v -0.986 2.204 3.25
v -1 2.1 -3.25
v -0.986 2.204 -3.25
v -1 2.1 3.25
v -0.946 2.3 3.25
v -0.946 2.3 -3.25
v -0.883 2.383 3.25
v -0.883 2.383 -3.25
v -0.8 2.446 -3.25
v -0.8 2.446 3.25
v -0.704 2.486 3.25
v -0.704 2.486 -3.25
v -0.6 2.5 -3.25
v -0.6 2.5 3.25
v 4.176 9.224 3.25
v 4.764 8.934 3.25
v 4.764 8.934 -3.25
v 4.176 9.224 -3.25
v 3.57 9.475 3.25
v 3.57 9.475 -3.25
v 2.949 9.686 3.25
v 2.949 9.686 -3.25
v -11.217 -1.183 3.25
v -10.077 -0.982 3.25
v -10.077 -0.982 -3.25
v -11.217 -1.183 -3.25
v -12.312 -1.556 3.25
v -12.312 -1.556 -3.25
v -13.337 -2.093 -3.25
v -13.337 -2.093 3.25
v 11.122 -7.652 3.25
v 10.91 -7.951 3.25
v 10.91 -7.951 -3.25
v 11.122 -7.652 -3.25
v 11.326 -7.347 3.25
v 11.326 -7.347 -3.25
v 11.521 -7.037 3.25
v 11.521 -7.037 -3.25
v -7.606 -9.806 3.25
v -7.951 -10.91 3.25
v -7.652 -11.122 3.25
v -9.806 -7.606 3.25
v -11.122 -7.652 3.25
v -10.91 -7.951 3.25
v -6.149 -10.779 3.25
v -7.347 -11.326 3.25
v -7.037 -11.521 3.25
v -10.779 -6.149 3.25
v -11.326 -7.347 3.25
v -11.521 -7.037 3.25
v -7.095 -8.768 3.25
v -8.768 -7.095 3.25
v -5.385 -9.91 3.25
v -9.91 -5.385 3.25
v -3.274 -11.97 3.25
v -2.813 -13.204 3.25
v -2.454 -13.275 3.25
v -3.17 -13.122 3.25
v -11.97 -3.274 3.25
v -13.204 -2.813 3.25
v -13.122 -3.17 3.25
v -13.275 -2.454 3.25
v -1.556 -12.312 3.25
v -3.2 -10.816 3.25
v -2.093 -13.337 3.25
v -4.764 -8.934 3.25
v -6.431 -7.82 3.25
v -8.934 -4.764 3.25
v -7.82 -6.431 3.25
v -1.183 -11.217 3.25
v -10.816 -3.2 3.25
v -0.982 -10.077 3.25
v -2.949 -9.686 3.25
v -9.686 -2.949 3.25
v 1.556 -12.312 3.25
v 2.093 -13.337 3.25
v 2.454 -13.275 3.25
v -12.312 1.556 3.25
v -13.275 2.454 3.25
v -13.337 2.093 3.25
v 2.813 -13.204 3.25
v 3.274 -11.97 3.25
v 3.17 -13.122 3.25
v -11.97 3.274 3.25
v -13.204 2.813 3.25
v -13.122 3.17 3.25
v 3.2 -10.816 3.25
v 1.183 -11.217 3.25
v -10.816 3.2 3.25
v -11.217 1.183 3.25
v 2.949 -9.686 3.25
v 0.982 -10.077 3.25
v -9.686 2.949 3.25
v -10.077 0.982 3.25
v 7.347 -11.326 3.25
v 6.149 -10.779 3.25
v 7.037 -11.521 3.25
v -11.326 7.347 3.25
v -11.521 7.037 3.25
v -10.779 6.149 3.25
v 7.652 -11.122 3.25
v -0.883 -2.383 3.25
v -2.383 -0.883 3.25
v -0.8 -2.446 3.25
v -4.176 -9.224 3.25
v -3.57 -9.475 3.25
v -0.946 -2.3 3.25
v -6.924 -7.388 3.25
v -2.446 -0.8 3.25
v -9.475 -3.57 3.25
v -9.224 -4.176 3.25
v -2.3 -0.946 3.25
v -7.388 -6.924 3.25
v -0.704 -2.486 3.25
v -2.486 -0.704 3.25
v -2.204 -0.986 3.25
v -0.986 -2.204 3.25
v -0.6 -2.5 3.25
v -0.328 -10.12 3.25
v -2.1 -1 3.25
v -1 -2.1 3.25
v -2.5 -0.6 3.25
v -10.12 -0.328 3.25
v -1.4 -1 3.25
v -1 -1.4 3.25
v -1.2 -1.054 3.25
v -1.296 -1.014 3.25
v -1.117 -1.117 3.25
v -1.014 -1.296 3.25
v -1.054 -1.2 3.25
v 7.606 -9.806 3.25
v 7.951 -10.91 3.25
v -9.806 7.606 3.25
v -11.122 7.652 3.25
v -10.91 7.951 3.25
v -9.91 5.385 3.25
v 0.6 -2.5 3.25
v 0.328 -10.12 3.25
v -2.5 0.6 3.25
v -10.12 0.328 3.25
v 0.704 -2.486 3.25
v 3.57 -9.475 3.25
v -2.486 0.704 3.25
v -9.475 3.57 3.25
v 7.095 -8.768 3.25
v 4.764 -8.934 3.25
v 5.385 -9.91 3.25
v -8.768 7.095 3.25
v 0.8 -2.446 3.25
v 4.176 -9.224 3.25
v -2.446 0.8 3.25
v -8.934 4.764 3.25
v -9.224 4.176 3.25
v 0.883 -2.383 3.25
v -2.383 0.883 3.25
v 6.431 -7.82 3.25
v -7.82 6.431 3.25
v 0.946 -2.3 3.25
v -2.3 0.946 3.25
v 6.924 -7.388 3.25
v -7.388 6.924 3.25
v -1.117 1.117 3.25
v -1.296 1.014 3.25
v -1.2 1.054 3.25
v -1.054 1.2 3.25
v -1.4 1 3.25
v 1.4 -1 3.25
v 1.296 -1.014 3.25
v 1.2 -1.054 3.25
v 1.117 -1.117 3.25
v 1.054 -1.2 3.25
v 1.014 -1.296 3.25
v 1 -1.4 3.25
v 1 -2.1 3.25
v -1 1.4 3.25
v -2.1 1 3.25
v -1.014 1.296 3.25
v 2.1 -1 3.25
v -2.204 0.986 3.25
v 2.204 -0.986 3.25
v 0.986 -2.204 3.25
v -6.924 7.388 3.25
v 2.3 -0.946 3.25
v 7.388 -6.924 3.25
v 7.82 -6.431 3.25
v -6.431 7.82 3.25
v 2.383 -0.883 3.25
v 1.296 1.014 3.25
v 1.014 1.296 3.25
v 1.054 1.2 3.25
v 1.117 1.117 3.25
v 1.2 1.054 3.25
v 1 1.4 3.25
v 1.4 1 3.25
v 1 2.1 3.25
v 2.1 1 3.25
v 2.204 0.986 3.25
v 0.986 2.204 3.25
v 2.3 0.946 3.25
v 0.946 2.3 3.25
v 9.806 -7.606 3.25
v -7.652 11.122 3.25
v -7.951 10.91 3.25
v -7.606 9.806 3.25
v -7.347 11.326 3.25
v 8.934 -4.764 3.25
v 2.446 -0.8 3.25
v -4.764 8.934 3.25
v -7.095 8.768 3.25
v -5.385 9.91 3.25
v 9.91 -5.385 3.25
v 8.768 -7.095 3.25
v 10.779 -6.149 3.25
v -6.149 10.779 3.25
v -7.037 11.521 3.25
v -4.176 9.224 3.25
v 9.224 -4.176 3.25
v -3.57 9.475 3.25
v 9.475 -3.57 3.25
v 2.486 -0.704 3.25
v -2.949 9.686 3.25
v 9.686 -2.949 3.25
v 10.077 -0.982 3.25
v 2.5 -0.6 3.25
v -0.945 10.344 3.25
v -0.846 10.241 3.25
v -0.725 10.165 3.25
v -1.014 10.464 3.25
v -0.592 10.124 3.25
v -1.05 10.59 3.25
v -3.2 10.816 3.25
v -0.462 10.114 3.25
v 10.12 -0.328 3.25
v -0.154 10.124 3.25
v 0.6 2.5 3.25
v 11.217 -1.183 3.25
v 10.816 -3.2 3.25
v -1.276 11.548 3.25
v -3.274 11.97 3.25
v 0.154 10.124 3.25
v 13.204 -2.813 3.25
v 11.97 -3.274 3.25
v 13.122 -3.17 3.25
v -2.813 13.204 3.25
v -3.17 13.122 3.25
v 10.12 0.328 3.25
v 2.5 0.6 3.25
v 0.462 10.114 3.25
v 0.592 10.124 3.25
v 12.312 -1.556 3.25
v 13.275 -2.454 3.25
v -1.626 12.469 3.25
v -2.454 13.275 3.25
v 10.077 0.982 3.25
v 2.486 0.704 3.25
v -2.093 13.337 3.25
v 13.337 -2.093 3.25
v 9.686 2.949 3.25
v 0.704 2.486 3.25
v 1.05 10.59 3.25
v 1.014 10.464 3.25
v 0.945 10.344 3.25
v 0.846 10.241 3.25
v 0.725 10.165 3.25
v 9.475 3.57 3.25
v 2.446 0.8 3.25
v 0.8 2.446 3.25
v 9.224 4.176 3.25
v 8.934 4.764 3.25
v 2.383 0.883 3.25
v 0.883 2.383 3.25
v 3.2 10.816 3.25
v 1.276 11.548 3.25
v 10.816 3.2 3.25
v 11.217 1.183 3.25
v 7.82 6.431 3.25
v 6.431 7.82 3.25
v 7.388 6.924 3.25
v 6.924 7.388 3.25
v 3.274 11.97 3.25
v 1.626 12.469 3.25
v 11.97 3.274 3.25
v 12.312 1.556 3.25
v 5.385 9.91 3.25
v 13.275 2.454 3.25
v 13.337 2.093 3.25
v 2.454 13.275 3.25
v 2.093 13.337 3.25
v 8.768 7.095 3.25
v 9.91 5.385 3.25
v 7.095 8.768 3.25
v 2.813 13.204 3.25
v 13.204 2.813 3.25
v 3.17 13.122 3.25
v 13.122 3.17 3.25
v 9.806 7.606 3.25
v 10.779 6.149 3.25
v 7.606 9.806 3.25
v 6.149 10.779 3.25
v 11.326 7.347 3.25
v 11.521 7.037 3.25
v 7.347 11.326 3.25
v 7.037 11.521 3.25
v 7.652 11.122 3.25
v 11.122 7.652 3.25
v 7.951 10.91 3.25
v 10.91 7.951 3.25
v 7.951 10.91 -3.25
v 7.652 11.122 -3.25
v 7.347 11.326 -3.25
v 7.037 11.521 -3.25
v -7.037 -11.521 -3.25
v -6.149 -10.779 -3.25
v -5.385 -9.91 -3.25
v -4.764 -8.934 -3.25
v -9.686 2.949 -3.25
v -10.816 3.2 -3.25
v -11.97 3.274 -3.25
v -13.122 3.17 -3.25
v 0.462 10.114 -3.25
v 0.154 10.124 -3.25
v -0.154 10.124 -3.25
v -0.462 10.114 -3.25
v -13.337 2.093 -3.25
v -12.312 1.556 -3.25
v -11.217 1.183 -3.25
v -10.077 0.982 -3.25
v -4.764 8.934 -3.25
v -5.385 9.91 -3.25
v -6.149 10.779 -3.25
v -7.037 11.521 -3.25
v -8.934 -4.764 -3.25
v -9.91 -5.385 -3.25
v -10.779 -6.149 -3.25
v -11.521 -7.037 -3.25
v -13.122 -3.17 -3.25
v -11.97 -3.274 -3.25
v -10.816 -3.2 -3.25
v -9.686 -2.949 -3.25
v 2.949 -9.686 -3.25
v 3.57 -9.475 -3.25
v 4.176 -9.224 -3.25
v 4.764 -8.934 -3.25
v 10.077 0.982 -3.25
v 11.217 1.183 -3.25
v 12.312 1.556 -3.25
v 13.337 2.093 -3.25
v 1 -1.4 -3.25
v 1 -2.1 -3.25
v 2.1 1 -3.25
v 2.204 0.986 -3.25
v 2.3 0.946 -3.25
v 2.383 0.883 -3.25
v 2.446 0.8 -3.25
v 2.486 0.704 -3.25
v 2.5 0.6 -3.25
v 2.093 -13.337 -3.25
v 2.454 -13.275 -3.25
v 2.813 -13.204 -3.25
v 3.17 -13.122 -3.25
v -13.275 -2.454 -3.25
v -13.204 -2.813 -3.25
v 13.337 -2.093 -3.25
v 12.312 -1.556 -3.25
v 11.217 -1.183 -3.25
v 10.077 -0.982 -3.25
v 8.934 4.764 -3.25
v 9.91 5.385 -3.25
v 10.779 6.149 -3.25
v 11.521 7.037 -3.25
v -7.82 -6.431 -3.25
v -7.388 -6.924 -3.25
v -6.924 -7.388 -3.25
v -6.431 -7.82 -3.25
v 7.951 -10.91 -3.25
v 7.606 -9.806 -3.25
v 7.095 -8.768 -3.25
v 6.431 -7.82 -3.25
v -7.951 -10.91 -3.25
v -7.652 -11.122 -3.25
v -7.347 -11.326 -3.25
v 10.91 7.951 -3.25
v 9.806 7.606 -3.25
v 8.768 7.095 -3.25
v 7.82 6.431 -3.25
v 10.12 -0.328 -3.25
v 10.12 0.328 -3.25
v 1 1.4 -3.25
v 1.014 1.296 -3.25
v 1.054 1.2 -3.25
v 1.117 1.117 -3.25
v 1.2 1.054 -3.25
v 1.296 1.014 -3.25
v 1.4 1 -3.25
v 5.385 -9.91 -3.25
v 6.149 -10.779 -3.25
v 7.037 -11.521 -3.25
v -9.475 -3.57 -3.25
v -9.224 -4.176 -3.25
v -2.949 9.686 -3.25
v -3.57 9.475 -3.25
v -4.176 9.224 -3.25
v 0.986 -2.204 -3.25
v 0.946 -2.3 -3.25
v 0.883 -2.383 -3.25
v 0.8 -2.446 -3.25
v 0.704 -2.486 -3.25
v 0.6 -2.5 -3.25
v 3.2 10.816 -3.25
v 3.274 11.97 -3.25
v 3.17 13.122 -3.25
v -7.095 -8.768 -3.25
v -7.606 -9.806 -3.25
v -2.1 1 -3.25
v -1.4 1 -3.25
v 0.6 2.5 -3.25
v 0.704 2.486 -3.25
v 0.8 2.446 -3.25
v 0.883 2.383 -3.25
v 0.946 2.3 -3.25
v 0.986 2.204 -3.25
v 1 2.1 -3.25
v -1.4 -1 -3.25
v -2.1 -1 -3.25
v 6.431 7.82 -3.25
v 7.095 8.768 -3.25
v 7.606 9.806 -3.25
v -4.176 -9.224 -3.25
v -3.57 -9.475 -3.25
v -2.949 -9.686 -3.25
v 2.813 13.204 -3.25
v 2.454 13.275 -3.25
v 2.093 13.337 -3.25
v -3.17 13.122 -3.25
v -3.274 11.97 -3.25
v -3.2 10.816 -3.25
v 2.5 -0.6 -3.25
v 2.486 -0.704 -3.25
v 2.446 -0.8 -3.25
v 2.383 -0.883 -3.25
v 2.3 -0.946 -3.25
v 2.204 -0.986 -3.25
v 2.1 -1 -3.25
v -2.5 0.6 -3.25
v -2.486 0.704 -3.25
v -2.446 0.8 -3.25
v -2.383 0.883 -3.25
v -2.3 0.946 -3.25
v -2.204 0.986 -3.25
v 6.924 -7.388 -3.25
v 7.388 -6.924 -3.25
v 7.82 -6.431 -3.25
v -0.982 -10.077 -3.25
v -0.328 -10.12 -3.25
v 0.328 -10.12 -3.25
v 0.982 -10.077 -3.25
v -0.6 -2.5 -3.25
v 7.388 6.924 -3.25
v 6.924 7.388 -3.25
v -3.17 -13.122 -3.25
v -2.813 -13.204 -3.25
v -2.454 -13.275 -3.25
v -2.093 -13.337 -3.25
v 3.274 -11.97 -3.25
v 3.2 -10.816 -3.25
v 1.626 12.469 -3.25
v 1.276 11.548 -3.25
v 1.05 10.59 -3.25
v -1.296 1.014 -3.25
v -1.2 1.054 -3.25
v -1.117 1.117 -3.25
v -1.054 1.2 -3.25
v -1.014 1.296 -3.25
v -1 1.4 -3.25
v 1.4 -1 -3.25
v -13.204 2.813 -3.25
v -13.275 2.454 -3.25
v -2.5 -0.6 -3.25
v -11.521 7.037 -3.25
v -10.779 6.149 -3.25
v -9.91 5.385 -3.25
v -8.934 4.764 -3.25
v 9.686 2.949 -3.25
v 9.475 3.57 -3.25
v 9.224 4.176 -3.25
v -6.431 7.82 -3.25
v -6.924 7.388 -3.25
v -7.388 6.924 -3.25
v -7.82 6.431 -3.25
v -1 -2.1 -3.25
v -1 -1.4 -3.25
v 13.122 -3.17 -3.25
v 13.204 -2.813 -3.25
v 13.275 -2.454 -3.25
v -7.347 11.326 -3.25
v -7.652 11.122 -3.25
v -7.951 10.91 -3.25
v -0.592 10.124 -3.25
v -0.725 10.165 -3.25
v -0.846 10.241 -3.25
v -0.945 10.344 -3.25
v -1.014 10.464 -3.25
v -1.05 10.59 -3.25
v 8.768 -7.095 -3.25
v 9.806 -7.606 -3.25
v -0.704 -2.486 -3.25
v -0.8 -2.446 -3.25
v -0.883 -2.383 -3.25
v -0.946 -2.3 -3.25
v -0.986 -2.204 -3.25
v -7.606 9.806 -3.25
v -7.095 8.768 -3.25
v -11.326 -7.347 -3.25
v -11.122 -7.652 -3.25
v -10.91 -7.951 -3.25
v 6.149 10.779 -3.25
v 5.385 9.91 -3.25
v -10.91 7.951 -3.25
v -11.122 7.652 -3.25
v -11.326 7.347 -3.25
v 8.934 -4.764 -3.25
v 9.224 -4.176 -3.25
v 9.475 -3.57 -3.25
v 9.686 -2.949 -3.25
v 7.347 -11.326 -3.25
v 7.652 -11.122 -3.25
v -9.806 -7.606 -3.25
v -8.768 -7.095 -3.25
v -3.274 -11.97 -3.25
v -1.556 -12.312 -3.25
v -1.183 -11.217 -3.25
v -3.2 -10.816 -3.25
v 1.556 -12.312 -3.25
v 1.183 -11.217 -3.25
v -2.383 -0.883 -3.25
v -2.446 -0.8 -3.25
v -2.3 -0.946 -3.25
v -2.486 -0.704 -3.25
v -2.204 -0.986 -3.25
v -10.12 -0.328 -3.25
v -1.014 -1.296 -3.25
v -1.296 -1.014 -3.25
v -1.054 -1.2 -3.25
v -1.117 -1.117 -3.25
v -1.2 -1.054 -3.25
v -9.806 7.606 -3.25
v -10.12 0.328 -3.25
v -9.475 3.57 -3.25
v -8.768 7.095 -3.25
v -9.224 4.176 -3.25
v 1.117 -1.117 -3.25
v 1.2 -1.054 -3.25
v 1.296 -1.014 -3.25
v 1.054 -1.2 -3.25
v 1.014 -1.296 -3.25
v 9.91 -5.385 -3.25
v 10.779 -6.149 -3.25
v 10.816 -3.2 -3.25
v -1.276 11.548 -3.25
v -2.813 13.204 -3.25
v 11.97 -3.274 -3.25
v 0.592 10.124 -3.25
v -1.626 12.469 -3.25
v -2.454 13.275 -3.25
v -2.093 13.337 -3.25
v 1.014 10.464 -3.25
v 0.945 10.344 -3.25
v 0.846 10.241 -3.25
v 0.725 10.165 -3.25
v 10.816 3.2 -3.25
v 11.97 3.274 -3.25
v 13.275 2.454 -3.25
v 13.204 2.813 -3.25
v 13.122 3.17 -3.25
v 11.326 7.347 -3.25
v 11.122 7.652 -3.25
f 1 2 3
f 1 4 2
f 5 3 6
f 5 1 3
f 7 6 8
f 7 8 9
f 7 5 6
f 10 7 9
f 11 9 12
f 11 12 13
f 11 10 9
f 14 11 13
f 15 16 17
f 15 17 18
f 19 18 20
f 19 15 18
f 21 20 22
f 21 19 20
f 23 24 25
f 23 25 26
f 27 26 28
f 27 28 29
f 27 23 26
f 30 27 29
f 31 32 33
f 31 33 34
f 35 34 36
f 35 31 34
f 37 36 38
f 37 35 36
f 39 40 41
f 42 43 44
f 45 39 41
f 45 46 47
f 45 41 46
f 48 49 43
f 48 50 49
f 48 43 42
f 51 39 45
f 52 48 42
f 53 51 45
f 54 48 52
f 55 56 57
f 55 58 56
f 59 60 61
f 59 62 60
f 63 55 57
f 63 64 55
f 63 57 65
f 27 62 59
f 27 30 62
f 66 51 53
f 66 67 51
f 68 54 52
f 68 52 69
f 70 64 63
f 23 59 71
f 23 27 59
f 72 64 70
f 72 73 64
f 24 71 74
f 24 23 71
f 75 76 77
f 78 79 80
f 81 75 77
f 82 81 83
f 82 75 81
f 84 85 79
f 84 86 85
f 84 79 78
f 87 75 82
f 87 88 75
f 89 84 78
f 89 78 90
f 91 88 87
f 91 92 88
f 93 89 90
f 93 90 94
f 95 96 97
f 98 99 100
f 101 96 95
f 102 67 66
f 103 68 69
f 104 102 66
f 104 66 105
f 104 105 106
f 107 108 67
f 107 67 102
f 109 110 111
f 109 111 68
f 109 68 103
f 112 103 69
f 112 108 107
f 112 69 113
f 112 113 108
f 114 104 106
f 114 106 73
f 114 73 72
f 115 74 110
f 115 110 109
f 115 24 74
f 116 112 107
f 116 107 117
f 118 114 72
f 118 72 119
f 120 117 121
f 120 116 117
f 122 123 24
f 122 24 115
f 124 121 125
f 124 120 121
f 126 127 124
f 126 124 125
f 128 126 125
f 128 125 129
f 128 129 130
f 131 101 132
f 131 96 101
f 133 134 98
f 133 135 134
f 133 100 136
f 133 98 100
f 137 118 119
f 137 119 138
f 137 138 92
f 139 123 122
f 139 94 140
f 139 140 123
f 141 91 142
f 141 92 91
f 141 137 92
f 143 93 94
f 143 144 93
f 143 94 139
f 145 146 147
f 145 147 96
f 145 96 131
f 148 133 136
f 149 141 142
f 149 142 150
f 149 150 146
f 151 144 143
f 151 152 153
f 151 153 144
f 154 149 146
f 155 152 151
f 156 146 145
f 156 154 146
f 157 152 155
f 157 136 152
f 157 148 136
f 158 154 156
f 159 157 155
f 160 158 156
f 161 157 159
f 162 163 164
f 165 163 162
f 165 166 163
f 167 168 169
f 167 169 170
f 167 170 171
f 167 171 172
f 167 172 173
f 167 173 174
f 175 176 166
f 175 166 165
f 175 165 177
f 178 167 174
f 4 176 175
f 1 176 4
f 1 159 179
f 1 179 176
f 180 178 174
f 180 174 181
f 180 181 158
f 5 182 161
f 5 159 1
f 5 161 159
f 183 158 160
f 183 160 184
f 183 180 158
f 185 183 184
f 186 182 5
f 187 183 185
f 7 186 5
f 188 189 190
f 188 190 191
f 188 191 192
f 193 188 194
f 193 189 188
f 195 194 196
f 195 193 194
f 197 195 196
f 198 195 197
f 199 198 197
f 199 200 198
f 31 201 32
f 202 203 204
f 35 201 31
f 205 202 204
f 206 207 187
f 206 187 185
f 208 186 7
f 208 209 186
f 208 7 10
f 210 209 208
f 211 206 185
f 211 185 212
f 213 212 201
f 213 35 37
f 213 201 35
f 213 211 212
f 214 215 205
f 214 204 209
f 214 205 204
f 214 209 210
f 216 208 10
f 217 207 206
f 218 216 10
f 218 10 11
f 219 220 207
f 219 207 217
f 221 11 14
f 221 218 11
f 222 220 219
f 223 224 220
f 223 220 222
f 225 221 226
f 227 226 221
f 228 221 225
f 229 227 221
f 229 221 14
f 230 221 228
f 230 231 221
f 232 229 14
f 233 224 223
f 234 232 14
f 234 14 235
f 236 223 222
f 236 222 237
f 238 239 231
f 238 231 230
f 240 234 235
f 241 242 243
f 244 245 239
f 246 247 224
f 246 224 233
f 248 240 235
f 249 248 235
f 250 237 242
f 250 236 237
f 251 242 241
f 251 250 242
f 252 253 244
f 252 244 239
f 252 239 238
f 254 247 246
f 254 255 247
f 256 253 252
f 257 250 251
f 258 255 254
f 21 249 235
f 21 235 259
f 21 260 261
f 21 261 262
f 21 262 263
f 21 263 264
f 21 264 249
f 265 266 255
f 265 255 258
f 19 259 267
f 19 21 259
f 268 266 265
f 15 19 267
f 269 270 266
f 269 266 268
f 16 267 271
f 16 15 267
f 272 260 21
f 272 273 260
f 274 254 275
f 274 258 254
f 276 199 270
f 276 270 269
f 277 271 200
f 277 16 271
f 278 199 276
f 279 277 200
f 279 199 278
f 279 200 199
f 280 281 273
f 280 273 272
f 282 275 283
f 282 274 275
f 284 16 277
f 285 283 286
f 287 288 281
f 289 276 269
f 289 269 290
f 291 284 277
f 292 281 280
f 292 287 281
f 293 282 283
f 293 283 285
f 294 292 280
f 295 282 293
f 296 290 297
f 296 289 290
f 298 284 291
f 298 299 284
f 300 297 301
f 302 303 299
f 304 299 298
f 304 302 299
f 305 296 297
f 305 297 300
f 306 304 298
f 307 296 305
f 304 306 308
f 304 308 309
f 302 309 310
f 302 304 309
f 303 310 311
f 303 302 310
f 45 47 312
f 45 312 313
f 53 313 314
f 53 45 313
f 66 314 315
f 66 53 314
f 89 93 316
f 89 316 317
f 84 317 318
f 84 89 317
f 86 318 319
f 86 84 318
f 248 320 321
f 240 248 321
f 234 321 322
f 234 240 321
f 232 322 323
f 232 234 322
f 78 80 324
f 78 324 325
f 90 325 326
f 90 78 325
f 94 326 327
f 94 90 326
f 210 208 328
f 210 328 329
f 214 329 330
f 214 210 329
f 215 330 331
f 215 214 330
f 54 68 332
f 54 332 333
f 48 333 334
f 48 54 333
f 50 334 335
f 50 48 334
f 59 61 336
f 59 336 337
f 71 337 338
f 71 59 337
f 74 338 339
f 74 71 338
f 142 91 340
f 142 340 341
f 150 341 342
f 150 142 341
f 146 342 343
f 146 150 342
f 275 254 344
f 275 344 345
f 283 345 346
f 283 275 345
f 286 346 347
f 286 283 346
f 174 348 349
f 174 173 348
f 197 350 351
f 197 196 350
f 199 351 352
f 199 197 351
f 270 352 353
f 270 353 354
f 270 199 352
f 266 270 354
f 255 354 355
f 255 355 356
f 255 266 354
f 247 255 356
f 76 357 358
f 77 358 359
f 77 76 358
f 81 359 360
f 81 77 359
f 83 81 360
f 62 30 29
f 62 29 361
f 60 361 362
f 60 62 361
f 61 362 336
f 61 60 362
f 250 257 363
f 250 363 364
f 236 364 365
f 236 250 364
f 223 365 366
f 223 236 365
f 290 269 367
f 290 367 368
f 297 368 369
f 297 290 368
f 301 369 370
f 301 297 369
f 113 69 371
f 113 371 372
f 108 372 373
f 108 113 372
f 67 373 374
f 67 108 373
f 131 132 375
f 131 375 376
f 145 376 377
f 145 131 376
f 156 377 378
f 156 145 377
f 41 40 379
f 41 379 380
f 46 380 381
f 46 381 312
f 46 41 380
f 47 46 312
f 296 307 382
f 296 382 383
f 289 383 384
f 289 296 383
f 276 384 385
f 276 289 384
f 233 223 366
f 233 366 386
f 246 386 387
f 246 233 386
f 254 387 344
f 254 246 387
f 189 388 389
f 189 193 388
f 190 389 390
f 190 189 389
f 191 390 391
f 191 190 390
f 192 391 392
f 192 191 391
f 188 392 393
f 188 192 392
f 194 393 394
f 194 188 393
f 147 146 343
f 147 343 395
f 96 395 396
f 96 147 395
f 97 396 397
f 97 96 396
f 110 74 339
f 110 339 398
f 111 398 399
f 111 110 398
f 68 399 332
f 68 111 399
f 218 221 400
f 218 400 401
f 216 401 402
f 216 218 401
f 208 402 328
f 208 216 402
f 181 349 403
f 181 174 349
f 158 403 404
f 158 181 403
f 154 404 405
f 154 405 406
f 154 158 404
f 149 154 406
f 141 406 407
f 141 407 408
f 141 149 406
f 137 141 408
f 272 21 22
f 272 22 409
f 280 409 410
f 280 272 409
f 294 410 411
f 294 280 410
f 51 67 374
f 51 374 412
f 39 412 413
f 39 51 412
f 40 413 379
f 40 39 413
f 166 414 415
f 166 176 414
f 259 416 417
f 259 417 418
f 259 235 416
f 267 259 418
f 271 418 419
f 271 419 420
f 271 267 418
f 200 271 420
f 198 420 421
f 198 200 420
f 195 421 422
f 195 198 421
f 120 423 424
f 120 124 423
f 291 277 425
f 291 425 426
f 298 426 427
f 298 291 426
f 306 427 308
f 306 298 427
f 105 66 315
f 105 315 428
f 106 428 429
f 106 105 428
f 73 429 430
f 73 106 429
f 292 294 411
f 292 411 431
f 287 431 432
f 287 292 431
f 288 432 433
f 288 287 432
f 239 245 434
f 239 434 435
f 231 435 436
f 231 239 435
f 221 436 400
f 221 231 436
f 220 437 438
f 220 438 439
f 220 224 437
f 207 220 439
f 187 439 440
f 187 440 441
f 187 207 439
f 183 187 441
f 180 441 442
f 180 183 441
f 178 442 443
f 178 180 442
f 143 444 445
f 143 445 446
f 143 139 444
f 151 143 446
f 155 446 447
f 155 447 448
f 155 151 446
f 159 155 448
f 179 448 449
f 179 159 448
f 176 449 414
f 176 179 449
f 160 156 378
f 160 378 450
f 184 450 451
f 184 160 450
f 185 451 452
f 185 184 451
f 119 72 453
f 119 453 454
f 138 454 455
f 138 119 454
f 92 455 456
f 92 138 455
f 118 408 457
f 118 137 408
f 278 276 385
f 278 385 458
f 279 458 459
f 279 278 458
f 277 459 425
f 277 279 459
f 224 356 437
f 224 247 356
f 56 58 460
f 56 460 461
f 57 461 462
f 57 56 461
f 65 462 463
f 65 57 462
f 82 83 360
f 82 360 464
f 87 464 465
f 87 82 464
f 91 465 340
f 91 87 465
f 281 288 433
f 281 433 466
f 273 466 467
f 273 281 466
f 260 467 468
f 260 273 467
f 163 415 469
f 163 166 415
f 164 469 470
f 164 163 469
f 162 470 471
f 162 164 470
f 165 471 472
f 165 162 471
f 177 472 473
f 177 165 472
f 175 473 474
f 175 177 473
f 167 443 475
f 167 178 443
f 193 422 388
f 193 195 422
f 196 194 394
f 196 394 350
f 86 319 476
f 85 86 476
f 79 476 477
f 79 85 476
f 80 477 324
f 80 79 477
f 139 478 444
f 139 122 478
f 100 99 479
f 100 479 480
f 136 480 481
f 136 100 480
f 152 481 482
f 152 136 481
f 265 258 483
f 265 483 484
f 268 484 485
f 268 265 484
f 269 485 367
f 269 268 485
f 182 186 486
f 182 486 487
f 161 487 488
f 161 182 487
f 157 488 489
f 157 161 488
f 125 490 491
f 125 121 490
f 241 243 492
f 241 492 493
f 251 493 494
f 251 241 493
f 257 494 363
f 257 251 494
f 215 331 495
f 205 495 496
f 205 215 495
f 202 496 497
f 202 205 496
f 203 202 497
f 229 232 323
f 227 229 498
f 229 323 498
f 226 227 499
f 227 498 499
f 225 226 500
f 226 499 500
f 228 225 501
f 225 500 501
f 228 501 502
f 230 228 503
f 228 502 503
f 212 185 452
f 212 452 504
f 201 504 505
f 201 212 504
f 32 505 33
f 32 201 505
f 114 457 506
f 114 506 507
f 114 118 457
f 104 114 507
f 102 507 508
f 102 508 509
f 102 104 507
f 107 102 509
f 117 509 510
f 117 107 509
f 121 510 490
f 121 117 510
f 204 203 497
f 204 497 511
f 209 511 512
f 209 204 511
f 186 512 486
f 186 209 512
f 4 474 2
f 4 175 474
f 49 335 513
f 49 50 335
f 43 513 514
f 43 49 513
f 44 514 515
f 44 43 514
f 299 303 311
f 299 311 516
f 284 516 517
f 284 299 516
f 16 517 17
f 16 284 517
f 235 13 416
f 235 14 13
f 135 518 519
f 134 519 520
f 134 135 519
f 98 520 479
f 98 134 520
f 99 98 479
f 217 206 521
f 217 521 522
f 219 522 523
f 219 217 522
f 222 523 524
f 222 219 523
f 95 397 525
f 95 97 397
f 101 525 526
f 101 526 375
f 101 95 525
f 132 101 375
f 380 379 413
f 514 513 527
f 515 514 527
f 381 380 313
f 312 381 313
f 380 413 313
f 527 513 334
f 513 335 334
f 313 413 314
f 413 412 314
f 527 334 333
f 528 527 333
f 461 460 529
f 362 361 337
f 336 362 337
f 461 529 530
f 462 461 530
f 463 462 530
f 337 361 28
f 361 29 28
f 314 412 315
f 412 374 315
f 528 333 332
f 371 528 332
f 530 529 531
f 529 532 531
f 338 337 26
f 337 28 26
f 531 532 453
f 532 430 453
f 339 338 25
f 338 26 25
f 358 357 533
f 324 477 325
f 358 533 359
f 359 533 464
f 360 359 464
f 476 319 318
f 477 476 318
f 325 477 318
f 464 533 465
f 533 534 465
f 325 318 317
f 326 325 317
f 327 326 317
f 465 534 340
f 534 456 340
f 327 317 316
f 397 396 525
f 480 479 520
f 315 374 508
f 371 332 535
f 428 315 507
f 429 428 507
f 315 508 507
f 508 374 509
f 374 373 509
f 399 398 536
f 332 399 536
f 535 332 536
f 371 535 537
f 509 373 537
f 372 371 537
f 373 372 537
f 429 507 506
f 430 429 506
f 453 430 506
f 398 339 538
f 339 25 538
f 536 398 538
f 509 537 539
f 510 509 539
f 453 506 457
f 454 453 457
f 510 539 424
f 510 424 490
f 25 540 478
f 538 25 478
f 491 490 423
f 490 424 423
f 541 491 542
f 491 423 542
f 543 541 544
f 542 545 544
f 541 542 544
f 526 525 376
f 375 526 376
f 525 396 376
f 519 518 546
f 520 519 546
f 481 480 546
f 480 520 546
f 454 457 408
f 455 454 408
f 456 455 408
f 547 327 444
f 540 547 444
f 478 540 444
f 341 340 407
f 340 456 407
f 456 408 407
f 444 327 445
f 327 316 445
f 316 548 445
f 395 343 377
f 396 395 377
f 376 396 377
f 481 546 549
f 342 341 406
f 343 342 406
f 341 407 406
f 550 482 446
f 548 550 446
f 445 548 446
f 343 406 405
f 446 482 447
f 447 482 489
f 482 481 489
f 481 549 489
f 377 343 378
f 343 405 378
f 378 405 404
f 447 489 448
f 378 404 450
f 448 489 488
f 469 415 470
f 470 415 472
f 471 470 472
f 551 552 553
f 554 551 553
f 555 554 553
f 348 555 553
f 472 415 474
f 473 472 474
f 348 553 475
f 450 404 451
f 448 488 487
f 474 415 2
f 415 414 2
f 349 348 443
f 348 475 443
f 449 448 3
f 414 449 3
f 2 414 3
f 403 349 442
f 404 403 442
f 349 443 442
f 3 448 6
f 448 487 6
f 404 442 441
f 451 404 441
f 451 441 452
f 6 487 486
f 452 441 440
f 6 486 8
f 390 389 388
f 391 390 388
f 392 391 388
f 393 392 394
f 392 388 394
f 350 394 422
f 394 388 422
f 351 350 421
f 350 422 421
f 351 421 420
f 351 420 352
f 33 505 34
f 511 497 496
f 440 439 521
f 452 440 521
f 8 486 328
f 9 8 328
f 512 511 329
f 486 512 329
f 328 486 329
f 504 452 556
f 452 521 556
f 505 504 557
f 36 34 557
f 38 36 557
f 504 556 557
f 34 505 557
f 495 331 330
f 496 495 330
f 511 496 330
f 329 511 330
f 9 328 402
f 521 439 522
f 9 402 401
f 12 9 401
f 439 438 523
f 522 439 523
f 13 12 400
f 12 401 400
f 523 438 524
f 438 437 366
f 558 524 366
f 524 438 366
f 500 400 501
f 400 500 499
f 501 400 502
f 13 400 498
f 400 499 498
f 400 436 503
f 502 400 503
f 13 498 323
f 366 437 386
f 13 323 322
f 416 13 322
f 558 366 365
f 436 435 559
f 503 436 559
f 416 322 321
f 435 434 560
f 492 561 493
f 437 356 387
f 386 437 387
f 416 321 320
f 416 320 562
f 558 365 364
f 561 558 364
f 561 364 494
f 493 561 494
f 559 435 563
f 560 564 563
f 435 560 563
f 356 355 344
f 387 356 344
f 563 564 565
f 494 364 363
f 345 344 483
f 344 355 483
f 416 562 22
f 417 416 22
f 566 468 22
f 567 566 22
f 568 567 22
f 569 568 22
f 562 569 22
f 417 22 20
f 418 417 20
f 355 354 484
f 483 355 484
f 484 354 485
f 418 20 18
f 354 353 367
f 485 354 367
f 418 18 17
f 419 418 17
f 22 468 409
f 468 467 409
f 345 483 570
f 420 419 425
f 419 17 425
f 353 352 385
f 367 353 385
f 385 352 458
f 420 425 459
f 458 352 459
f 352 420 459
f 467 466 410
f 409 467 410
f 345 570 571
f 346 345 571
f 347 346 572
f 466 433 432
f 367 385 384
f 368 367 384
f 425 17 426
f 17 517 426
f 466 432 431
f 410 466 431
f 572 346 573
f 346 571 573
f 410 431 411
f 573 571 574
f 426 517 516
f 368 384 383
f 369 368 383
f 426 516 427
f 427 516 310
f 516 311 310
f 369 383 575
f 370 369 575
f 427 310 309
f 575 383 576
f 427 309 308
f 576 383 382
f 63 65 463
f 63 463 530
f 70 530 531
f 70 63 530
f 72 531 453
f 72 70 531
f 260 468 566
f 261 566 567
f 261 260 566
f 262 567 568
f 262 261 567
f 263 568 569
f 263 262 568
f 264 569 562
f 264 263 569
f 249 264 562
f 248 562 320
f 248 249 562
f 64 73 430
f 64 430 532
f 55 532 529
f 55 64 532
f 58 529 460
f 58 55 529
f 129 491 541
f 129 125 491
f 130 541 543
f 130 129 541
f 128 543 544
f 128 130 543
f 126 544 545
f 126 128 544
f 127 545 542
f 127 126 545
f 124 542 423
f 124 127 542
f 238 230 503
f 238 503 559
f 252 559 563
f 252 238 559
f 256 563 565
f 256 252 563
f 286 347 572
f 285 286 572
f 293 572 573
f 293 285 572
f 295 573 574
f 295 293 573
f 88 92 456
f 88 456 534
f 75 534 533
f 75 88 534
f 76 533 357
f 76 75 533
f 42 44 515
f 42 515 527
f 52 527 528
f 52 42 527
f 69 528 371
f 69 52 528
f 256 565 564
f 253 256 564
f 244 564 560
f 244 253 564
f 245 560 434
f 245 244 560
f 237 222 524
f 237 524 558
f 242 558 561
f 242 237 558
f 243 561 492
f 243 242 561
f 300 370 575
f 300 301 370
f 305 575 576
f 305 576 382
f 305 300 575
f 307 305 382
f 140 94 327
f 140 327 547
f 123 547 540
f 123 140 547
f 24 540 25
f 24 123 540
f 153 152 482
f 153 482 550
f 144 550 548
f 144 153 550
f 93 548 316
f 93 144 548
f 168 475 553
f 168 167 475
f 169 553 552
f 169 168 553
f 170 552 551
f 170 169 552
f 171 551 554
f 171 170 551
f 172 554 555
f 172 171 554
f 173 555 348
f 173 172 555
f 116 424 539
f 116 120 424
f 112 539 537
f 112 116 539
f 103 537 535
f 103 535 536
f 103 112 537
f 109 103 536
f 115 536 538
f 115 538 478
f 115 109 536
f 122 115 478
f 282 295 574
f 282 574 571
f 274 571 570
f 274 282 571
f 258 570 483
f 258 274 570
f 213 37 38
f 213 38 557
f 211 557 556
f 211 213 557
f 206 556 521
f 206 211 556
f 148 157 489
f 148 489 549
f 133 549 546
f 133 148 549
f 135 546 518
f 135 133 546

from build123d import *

# Parameters (mm, degrees)
SKETCH1_R           = 13.5
BOSS_EXTRUDE1_DEPTH = 3.25
CUT_EXTRUDE1_DEPTH  = 4.25
FILLET1_R           = 0.57
CIRPATTERN3_COUNT   = 16


with BuildPart() as part:
    # Sketch1 → Boss-Extrude1 (new body, symmetric)
    with BuildSketch(Plane.XY):
        Circle(SKETCH1_R)
        with BuildLine():
            Line((1.4, 1), (2.1, 1))
            ThreePointArc((2.1, 1), (2.382842712, 0.882842712), (2.5, 0.6))
            Line((2.5, 0.6), (2.5, -0.6))
            ThreePointArc((2.5, -0.6), (2.382842712, -0.882842712), (2.1, -1))
            Line((2.1, -1), (1.4, -1))
            ThreePointArc((1.4, -1), (1.117157288, -1.117157288), (1, -1.4))
            Line((1, -1.4), (1, -2.1))
            ThreePointArc((1, -2.1), (0.882842712, -2.382842712), (0.6, -2.5))
            Line((0.6, -2.5), (-0.6, -2.5))
            ThreePointArc((-0.6, -2.5), (-0.882842712, -2.382842712), (-1, -2.1))
            Line((-1, -2.1), (-1, -1.4))
            ThreePointArc((-1, -1.4), (-1.117157288, -1.117157288), (-1.4, -1))
            Line((-1.4, -1), (-2.1, -1))
            ThreePointArc((-2.1, -1), (-2.382842712, -0.882842712), (-2.5, -0.6))
            Line((-2.5, -0.6), (-2.5, 0.6))
            ThreePointArc((-2.5, 0.6), (-2.382842712, 0.882842712), (-2.1, 1))
            Line((-2.1, 1), (-1.4, 1))
            ThreePointArc((-1.4, 1), (-1.117157288, 1.117157288), (-1, 1.4))
            Line((-1, 1.4), (-1, 2.1))
            ThreePointArc((-1, 2.1), (-0.882842712, 2.382842712), (-0.6, 2.5))
            Line((-0.6, 2.5), (0.6, 2.5))
            ThreePointArc((0.6, 2.5), (0.882842712, 2.382842712), (1, 2.1))
            Line((1, 2.1), (1, 1.4))
            ThreePointArc((1, 1.4), (1.117157288, 1.117157288), (1.4, 1))
        make_face(mode=Mode.SUBTRACT)
    extrude(amount=BOSS_EXTRUDE1_DEPTH, both=True)

    # Sketch2 → Cut-Extrude1 (cut, symmetric)
    with BuildSketch(Plane.XY):
        with BuildLine():
            ThreePointArc((0.982234387, 10.077243701), (0, 10.125), (-0.982234387, 10.077243701))
            ThreePointArc((-0.982234387, 10.077243701), (-1.348268622, 11.771504161), (-2.092826994, 13.336794037))
            ThreePointArc((-2.092826994, 13.336794037), (0, 13.5), (2.092826994, 13.336794037))
            ThreePointArc((2.092826994, 13.336794037), (1.348268622, 11.771504161), (0.982234387, 10.077243701))
        make_face()
    cut_extrude1 = extrude(amount=CUT_EXTRUDE1_DEPTH, both=True, mode=Mode.SUBTRACT)

    # Fillet1
    fillet1_edges = [part.edges().sort_by_distance(p)[0] for p in [
        (-0.982234387, 10.077243701, 0),
        (0.982234387, 10.077243701, 0),
    ]]
    fillet(fillet1_edges, radius=FILLET1_R)

    # CirPattern3: Cut-Extrude1 ×16 about axis
    cirpattern3_axis = Axis((0, 0, 0), (0, 0, 1))
    for i in range(1, CIRPATTERN3_COUNT):
        add(cut_extrude1.rotate(cirpattern3_axis, i * 360 / CIRPATTERN3_COUNT), mode=Mode.SUBTRACT)


solid = part.part
